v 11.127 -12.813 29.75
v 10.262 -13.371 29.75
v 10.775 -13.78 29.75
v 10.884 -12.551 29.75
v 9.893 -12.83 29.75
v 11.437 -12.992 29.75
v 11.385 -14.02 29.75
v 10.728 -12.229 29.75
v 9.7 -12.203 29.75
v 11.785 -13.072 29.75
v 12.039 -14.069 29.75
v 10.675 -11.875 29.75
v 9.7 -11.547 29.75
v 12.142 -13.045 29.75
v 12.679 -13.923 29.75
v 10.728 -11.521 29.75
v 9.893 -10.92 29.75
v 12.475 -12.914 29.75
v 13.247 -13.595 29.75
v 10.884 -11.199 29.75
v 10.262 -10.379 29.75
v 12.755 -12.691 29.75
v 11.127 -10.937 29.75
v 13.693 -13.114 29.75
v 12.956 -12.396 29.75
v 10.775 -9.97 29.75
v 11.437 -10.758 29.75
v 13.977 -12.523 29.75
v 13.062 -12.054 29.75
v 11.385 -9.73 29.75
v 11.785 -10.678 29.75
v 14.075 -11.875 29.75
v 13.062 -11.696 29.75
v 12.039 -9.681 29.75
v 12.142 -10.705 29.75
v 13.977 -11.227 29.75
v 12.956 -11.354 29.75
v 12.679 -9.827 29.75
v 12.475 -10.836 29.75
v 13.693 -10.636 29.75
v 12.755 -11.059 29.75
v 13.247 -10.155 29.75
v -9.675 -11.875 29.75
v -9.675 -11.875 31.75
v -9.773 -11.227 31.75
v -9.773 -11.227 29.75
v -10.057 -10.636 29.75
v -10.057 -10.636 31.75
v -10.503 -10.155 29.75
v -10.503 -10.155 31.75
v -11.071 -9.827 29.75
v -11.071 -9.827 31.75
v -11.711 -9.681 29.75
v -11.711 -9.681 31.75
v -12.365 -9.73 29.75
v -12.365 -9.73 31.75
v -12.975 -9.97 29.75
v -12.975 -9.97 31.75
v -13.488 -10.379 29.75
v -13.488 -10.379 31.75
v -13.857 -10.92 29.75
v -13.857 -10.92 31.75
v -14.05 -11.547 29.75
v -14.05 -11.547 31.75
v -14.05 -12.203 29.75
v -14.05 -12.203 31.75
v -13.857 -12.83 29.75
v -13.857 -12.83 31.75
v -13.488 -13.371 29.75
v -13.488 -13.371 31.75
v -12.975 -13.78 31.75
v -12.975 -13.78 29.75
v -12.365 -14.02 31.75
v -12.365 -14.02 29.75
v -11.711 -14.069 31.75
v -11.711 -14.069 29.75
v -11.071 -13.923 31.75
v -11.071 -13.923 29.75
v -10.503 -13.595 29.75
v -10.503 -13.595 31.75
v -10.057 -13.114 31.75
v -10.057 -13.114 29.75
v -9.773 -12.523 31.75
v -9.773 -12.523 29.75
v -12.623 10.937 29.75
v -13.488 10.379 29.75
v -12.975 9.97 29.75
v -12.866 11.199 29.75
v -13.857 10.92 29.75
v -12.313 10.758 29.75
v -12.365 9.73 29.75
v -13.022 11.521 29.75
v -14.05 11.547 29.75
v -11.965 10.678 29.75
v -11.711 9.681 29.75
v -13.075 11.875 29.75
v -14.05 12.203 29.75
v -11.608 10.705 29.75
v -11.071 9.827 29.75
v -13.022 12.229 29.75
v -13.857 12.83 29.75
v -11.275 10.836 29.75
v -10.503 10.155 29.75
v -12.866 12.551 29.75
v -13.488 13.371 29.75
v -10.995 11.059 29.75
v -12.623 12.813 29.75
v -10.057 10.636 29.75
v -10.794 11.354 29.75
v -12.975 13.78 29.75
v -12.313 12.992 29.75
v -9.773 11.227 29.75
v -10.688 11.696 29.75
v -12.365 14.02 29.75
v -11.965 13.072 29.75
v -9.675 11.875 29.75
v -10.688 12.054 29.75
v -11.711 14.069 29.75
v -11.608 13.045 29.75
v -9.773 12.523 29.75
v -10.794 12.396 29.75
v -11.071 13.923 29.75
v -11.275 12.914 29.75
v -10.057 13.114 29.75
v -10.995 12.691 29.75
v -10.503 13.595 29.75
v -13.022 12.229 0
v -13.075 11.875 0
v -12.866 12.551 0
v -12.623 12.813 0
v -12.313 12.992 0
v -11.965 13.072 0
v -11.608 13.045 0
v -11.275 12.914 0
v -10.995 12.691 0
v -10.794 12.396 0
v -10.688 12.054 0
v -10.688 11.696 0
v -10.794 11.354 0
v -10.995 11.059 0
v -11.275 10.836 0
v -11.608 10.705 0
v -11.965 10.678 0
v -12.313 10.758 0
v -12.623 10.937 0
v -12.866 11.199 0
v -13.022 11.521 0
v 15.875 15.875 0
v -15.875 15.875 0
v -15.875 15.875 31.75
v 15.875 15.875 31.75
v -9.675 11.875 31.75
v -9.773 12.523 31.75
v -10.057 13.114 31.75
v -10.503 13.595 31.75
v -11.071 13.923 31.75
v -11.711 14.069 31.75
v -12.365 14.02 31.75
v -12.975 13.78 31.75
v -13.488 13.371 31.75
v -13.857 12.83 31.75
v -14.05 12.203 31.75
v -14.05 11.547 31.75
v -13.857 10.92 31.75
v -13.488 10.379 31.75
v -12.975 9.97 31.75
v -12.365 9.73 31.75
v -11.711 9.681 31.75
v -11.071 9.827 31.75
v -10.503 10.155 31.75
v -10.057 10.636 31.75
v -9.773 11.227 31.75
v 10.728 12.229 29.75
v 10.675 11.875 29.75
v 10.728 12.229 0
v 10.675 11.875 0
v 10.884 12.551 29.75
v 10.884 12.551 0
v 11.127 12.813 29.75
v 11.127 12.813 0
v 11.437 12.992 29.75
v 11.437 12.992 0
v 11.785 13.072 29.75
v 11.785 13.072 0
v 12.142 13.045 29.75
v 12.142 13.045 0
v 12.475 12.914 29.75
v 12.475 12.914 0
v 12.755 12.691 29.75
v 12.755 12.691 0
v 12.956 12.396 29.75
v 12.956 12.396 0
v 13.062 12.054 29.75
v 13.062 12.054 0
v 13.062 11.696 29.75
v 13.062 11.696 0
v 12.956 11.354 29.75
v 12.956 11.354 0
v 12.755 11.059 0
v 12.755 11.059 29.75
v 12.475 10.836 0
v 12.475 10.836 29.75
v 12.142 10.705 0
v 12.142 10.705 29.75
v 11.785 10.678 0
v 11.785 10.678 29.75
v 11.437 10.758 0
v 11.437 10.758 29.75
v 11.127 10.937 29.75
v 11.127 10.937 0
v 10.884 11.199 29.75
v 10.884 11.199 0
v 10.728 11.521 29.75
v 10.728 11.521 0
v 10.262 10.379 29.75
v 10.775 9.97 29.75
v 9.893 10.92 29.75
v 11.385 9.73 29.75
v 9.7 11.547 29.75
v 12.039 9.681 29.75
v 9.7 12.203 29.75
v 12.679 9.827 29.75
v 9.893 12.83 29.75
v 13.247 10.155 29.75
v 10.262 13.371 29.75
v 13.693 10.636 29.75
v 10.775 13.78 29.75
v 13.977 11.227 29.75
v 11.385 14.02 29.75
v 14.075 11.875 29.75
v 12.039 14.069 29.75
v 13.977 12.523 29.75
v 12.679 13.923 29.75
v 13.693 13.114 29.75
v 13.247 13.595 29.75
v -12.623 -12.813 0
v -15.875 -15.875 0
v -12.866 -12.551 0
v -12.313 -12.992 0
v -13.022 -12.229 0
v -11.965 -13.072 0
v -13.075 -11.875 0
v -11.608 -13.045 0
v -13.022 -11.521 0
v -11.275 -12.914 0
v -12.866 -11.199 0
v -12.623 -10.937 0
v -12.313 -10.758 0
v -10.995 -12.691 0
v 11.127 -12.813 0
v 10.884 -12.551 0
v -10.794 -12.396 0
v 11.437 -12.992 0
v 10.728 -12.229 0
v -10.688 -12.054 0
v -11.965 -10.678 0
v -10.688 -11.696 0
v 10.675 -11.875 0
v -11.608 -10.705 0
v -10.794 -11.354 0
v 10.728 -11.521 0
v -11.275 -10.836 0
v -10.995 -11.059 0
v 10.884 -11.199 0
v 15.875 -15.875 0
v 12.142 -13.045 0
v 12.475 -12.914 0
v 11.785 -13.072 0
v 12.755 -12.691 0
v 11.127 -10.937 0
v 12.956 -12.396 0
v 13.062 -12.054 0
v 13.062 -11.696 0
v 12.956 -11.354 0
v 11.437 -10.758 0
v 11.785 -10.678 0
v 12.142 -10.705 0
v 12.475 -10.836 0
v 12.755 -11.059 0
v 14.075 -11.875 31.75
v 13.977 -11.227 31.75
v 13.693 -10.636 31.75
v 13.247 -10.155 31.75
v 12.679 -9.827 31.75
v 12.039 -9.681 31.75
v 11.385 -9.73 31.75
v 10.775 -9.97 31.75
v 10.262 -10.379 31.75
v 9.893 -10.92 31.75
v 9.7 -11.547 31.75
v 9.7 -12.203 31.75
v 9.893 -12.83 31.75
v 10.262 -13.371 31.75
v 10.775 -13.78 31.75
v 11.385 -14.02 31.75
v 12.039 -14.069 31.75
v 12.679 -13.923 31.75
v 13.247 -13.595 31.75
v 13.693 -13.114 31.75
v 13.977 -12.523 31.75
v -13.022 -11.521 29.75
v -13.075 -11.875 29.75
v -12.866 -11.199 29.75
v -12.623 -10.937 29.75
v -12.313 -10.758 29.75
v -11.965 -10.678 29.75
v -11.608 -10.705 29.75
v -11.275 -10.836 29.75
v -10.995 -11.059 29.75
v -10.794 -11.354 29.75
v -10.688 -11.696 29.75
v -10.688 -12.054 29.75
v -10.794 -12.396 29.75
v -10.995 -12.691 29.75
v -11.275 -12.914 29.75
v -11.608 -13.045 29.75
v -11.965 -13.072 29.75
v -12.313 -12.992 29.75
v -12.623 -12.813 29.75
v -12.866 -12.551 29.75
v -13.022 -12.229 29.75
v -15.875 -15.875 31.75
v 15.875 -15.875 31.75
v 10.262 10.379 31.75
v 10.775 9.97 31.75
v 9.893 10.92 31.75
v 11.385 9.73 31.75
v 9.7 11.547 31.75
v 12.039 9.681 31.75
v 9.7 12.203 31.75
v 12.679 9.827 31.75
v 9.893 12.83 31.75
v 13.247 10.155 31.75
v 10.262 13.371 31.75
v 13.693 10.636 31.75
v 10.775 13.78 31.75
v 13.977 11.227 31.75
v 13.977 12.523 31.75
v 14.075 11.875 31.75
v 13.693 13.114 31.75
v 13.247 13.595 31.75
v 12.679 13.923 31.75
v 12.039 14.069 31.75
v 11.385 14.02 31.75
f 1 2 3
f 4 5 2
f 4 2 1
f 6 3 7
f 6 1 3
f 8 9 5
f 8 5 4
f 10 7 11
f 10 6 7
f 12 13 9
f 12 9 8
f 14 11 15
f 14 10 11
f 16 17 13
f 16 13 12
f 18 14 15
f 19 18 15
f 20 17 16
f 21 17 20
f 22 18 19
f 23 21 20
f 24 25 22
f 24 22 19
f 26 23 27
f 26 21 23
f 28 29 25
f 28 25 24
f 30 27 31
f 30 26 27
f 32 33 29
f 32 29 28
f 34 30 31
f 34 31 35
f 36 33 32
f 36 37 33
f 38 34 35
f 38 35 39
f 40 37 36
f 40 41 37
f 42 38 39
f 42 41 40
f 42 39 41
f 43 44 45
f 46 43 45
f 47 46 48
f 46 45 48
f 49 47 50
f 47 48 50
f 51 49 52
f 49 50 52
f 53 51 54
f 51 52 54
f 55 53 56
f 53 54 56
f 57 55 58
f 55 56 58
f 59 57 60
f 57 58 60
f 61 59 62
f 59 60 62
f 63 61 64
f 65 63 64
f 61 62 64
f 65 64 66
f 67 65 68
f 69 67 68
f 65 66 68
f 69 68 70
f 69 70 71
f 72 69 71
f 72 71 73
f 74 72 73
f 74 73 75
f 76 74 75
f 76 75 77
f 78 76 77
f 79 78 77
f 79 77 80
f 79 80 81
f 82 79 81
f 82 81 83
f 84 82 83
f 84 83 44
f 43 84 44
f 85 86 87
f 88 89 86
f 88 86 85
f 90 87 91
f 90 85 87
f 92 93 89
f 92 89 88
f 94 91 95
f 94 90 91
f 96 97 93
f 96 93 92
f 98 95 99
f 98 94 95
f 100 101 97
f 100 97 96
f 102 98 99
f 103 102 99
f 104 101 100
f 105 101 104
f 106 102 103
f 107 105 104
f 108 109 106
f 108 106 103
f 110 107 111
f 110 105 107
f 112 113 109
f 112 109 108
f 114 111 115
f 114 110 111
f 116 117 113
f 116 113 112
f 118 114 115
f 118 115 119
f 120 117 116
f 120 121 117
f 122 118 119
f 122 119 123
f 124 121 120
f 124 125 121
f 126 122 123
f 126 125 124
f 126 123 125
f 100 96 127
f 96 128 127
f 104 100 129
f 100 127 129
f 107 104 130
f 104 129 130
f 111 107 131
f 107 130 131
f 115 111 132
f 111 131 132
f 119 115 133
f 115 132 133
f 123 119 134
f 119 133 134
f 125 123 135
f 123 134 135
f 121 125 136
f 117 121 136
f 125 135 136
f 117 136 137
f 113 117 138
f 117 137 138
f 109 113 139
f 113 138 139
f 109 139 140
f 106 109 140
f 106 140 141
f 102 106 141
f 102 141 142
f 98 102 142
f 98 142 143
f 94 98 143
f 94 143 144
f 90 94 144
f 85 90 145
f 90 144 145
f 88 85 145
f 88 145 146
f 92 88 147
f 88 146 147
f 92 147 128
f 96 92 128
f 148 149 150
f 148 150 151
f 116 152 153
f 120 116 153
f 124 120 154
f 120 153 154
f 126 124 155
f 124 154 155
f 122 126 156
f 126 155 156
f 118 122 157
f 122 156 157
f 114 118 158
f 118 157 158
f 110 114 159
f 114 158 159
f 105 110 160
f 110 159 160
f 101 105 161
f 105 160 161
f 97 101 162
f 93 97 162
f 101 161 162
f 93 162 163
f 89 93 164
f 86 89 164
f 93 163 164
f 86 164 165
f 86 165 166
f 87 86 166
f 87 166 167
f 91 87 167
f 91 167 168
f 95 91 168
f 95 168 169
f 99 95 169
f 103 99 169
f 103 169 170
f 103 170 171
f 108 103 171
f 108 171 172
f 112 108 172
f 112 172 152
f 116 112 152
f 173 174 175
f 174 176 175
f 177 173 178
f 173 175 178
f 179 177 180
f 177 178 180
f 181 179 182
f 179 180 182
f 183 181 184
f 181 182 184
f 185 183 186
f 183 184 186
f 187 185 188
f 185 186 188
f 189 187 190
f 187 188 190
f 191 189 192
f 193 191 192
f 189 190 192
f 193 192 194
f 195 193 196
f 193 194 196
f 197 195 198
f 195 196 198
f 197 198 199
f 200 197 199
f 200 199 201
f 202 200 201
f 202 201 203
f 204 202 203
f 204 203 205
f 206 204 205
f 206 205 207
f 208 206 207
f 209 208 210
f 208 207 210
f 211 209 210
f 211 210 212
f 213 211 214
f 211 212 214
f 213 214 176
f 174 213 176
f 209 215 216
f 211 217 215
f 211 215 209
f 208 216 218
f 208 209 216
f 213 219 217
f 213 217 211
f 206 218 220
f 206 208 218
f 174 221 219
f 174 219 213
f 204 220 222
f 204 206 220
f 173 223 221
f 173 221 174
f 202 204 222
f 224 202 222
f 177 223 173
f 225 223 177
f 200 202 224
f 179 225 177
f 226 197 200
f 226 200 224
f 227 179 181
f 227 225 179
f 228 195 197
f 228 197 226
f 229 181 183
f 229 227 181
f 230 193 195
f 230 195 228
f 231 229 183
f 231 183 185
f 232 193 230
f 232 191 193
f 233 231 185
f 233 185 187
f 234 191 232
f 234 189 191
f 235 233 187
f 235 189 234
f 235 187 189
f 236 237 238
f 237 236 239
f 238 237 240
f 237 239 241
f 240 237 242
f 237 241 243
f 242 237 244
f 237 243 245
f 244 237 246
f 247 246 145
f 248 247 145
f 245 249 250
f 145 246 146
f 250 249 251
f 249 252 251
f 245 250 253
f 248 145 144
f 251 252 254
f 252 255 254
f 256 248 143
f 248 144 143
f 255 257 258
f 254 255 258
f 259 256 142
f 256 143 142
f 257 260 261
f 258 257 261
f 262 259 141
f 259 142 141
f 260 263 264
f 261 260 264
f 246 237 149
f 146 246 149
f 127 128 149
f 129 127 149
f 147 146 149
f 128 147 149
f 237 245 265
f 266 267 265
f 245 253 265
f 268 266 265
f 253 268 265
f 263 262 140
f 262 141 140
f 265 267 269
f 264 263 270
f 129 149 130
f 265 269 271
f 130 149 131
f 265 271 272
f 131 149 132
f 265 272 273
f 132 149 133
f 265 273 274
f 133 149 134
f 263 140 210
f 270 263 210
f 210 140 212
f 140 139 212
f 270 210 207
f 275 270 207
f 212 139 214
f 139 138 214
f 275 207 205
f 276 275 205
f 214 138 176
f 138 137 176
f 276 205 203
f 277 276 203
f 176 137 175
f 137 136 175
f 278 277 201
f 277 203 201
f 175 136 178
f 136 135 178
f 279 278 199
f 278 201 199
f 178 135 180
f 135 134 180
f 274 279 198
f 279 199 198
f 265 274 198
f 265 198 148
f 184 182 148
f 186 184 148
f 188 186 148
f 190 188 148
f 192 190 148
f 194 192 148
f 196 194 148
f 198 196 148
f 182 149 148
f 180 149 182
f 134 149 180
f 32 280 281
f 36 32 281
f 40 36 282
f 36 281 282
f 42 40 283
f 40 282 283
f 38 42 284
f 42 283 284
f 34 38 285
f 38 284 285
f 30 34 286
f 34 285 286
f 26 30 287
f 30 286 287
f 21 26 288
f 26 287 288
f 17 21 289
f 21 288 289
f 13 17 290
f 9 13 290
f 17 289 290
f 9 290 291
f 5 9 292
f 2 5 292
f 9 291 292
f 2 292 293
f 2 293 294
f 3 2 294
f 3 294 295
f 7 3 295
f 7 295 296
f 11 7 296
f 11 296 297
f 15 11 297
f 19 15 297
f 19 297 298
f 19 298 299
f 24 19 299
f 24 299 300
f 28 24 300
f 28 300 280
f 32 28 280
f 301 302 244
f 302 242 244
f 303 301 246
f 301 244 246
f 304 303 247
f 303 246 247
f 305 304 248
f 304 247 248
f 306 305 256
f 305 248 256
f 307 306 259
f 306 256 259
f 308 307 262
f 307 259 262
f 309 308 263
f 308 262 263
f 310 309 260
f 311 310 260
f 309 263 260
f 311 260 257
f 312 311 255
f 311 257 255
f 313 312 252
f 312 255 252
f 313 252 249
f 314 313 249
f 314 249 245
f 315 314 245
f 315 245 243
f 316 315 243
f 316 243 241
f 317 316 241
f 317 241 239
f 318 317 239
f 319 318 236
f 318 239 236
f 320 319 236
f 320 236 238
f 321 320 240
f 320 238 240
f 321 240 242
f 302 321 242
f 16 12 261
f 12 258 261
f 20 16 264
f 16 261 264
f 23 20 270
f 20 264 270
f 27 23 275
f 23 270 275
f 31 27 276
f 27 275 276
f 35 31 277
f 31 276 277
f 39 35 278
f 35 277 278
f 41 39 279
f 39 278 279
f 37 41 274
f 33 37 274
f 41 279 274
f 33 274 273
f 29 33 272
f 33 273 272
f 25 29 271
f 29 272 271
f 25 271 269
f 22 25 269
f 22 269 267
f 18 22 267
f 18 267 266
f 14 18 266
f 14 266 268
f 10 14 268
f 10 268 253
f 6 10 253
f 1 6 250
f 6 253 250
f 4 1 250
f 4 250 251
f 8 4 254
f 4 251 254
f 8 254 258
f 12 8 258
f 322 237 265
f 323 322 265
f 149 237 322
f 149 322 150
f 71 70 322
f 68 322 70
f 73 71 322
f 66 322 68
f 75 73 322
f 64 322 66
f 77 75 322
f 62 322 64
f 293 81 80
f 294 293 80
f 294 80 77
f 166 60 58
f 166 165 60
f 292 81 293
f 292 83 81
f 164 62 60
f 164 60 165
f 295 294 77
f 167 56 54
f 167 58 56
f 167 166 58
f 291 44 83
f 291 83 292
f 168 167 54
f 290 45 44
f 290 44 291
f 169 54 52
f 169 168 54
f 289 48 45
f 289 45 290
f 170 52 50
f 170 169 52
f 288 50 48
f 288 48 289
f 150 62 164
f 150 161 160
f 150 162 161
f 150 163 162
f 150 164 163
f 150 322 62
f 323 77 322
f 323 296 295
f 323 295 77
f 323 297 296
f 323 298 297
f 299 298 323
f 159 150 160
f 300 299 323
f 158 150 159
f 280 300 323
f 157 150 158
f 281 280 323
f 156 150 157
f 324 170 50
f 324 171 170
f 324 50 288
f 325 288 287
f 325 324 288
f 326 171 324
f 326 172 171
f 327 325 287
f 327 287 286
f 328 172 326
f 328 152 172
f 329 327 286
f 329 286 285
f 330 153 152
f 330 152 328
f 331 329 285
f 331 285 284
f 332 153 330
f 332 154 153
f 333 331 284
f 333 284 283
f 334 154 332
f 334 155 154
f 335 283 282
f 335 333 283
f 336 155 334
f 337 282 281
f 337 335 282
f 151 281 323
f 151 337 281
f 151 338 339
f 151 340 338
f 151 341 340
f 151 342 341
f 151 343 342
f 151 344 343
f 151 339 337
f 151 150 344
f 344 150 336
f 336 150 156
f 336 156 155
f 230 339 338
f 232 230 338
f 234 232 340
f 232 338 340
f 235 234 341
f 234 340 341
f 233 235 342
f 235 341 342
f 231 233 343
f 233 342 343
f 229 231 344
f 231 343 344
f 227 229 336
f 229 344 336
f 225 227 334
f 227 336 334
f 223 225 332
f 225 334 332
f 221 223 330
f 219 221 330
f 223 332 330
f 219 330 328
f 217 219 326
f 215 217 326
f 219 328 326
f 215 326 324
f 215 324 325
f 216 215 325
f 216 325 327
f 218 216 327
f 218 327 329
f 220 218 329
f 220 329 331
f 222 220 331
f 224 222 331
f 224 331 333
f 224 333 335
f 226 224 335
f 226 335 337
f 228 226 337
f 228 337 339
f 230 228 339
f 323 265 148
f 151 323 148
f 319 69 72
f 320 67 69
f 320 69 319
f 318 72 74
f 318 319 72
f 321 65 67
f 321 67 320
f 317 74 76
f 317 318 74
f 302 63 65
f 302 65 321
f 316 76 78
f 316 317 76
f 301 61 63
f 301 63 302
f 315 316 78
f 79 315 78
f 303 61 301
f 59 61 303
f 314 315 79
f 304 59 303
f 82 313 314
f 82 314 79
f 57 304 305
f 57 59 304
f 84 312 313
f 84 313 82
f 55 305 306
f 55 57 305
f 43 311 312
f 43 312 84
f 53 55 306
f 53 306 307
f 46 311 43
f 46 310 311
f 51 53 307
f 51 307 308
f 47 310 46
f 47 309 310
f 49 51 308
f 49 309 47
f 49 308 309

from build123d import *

# Parameters (mm, degrees)
SKETCH1_W                      = 31.75
SKETCH1_H                      = 31.75
BOSS_EXTRUDE1_DEPTH            = 31.75
CBORE_FOR_M2_SHCS1_D           = 2.4
CBORE_FOR_M2_SHCS1_CBORE_D     = 4.4
CBORE_FOR_M2_SHCS1_CBORE_DEPTH = 2


with BuildPart() as part:
    # Sketch1 → Boss-Extrude1 (new body)
    with BuildSketch(Plane.XY):
        Rectangle(SKETCH1_W, SKETCH1_H)
    extrude(amount=BOSS_EXTRUDE1_DEPTH)

    # CBORE for M2 SHCS1 (through all)
    with Locations(Plane.XY.offset(31.75)):
        with Locations((-11.875, 11.875), (11.875, 11.875), (11.875, -11.875), (-11.875, -11.875)):
            CounterBoreHole(CBORE_FOR_M2_SHCS1_D / 2, CBORE_FOR_M2_SHCS1_CBORE_D / 2, CBORE_FOR_M2_SHCS1_CBORE_DEPTH)


solid = part.part
